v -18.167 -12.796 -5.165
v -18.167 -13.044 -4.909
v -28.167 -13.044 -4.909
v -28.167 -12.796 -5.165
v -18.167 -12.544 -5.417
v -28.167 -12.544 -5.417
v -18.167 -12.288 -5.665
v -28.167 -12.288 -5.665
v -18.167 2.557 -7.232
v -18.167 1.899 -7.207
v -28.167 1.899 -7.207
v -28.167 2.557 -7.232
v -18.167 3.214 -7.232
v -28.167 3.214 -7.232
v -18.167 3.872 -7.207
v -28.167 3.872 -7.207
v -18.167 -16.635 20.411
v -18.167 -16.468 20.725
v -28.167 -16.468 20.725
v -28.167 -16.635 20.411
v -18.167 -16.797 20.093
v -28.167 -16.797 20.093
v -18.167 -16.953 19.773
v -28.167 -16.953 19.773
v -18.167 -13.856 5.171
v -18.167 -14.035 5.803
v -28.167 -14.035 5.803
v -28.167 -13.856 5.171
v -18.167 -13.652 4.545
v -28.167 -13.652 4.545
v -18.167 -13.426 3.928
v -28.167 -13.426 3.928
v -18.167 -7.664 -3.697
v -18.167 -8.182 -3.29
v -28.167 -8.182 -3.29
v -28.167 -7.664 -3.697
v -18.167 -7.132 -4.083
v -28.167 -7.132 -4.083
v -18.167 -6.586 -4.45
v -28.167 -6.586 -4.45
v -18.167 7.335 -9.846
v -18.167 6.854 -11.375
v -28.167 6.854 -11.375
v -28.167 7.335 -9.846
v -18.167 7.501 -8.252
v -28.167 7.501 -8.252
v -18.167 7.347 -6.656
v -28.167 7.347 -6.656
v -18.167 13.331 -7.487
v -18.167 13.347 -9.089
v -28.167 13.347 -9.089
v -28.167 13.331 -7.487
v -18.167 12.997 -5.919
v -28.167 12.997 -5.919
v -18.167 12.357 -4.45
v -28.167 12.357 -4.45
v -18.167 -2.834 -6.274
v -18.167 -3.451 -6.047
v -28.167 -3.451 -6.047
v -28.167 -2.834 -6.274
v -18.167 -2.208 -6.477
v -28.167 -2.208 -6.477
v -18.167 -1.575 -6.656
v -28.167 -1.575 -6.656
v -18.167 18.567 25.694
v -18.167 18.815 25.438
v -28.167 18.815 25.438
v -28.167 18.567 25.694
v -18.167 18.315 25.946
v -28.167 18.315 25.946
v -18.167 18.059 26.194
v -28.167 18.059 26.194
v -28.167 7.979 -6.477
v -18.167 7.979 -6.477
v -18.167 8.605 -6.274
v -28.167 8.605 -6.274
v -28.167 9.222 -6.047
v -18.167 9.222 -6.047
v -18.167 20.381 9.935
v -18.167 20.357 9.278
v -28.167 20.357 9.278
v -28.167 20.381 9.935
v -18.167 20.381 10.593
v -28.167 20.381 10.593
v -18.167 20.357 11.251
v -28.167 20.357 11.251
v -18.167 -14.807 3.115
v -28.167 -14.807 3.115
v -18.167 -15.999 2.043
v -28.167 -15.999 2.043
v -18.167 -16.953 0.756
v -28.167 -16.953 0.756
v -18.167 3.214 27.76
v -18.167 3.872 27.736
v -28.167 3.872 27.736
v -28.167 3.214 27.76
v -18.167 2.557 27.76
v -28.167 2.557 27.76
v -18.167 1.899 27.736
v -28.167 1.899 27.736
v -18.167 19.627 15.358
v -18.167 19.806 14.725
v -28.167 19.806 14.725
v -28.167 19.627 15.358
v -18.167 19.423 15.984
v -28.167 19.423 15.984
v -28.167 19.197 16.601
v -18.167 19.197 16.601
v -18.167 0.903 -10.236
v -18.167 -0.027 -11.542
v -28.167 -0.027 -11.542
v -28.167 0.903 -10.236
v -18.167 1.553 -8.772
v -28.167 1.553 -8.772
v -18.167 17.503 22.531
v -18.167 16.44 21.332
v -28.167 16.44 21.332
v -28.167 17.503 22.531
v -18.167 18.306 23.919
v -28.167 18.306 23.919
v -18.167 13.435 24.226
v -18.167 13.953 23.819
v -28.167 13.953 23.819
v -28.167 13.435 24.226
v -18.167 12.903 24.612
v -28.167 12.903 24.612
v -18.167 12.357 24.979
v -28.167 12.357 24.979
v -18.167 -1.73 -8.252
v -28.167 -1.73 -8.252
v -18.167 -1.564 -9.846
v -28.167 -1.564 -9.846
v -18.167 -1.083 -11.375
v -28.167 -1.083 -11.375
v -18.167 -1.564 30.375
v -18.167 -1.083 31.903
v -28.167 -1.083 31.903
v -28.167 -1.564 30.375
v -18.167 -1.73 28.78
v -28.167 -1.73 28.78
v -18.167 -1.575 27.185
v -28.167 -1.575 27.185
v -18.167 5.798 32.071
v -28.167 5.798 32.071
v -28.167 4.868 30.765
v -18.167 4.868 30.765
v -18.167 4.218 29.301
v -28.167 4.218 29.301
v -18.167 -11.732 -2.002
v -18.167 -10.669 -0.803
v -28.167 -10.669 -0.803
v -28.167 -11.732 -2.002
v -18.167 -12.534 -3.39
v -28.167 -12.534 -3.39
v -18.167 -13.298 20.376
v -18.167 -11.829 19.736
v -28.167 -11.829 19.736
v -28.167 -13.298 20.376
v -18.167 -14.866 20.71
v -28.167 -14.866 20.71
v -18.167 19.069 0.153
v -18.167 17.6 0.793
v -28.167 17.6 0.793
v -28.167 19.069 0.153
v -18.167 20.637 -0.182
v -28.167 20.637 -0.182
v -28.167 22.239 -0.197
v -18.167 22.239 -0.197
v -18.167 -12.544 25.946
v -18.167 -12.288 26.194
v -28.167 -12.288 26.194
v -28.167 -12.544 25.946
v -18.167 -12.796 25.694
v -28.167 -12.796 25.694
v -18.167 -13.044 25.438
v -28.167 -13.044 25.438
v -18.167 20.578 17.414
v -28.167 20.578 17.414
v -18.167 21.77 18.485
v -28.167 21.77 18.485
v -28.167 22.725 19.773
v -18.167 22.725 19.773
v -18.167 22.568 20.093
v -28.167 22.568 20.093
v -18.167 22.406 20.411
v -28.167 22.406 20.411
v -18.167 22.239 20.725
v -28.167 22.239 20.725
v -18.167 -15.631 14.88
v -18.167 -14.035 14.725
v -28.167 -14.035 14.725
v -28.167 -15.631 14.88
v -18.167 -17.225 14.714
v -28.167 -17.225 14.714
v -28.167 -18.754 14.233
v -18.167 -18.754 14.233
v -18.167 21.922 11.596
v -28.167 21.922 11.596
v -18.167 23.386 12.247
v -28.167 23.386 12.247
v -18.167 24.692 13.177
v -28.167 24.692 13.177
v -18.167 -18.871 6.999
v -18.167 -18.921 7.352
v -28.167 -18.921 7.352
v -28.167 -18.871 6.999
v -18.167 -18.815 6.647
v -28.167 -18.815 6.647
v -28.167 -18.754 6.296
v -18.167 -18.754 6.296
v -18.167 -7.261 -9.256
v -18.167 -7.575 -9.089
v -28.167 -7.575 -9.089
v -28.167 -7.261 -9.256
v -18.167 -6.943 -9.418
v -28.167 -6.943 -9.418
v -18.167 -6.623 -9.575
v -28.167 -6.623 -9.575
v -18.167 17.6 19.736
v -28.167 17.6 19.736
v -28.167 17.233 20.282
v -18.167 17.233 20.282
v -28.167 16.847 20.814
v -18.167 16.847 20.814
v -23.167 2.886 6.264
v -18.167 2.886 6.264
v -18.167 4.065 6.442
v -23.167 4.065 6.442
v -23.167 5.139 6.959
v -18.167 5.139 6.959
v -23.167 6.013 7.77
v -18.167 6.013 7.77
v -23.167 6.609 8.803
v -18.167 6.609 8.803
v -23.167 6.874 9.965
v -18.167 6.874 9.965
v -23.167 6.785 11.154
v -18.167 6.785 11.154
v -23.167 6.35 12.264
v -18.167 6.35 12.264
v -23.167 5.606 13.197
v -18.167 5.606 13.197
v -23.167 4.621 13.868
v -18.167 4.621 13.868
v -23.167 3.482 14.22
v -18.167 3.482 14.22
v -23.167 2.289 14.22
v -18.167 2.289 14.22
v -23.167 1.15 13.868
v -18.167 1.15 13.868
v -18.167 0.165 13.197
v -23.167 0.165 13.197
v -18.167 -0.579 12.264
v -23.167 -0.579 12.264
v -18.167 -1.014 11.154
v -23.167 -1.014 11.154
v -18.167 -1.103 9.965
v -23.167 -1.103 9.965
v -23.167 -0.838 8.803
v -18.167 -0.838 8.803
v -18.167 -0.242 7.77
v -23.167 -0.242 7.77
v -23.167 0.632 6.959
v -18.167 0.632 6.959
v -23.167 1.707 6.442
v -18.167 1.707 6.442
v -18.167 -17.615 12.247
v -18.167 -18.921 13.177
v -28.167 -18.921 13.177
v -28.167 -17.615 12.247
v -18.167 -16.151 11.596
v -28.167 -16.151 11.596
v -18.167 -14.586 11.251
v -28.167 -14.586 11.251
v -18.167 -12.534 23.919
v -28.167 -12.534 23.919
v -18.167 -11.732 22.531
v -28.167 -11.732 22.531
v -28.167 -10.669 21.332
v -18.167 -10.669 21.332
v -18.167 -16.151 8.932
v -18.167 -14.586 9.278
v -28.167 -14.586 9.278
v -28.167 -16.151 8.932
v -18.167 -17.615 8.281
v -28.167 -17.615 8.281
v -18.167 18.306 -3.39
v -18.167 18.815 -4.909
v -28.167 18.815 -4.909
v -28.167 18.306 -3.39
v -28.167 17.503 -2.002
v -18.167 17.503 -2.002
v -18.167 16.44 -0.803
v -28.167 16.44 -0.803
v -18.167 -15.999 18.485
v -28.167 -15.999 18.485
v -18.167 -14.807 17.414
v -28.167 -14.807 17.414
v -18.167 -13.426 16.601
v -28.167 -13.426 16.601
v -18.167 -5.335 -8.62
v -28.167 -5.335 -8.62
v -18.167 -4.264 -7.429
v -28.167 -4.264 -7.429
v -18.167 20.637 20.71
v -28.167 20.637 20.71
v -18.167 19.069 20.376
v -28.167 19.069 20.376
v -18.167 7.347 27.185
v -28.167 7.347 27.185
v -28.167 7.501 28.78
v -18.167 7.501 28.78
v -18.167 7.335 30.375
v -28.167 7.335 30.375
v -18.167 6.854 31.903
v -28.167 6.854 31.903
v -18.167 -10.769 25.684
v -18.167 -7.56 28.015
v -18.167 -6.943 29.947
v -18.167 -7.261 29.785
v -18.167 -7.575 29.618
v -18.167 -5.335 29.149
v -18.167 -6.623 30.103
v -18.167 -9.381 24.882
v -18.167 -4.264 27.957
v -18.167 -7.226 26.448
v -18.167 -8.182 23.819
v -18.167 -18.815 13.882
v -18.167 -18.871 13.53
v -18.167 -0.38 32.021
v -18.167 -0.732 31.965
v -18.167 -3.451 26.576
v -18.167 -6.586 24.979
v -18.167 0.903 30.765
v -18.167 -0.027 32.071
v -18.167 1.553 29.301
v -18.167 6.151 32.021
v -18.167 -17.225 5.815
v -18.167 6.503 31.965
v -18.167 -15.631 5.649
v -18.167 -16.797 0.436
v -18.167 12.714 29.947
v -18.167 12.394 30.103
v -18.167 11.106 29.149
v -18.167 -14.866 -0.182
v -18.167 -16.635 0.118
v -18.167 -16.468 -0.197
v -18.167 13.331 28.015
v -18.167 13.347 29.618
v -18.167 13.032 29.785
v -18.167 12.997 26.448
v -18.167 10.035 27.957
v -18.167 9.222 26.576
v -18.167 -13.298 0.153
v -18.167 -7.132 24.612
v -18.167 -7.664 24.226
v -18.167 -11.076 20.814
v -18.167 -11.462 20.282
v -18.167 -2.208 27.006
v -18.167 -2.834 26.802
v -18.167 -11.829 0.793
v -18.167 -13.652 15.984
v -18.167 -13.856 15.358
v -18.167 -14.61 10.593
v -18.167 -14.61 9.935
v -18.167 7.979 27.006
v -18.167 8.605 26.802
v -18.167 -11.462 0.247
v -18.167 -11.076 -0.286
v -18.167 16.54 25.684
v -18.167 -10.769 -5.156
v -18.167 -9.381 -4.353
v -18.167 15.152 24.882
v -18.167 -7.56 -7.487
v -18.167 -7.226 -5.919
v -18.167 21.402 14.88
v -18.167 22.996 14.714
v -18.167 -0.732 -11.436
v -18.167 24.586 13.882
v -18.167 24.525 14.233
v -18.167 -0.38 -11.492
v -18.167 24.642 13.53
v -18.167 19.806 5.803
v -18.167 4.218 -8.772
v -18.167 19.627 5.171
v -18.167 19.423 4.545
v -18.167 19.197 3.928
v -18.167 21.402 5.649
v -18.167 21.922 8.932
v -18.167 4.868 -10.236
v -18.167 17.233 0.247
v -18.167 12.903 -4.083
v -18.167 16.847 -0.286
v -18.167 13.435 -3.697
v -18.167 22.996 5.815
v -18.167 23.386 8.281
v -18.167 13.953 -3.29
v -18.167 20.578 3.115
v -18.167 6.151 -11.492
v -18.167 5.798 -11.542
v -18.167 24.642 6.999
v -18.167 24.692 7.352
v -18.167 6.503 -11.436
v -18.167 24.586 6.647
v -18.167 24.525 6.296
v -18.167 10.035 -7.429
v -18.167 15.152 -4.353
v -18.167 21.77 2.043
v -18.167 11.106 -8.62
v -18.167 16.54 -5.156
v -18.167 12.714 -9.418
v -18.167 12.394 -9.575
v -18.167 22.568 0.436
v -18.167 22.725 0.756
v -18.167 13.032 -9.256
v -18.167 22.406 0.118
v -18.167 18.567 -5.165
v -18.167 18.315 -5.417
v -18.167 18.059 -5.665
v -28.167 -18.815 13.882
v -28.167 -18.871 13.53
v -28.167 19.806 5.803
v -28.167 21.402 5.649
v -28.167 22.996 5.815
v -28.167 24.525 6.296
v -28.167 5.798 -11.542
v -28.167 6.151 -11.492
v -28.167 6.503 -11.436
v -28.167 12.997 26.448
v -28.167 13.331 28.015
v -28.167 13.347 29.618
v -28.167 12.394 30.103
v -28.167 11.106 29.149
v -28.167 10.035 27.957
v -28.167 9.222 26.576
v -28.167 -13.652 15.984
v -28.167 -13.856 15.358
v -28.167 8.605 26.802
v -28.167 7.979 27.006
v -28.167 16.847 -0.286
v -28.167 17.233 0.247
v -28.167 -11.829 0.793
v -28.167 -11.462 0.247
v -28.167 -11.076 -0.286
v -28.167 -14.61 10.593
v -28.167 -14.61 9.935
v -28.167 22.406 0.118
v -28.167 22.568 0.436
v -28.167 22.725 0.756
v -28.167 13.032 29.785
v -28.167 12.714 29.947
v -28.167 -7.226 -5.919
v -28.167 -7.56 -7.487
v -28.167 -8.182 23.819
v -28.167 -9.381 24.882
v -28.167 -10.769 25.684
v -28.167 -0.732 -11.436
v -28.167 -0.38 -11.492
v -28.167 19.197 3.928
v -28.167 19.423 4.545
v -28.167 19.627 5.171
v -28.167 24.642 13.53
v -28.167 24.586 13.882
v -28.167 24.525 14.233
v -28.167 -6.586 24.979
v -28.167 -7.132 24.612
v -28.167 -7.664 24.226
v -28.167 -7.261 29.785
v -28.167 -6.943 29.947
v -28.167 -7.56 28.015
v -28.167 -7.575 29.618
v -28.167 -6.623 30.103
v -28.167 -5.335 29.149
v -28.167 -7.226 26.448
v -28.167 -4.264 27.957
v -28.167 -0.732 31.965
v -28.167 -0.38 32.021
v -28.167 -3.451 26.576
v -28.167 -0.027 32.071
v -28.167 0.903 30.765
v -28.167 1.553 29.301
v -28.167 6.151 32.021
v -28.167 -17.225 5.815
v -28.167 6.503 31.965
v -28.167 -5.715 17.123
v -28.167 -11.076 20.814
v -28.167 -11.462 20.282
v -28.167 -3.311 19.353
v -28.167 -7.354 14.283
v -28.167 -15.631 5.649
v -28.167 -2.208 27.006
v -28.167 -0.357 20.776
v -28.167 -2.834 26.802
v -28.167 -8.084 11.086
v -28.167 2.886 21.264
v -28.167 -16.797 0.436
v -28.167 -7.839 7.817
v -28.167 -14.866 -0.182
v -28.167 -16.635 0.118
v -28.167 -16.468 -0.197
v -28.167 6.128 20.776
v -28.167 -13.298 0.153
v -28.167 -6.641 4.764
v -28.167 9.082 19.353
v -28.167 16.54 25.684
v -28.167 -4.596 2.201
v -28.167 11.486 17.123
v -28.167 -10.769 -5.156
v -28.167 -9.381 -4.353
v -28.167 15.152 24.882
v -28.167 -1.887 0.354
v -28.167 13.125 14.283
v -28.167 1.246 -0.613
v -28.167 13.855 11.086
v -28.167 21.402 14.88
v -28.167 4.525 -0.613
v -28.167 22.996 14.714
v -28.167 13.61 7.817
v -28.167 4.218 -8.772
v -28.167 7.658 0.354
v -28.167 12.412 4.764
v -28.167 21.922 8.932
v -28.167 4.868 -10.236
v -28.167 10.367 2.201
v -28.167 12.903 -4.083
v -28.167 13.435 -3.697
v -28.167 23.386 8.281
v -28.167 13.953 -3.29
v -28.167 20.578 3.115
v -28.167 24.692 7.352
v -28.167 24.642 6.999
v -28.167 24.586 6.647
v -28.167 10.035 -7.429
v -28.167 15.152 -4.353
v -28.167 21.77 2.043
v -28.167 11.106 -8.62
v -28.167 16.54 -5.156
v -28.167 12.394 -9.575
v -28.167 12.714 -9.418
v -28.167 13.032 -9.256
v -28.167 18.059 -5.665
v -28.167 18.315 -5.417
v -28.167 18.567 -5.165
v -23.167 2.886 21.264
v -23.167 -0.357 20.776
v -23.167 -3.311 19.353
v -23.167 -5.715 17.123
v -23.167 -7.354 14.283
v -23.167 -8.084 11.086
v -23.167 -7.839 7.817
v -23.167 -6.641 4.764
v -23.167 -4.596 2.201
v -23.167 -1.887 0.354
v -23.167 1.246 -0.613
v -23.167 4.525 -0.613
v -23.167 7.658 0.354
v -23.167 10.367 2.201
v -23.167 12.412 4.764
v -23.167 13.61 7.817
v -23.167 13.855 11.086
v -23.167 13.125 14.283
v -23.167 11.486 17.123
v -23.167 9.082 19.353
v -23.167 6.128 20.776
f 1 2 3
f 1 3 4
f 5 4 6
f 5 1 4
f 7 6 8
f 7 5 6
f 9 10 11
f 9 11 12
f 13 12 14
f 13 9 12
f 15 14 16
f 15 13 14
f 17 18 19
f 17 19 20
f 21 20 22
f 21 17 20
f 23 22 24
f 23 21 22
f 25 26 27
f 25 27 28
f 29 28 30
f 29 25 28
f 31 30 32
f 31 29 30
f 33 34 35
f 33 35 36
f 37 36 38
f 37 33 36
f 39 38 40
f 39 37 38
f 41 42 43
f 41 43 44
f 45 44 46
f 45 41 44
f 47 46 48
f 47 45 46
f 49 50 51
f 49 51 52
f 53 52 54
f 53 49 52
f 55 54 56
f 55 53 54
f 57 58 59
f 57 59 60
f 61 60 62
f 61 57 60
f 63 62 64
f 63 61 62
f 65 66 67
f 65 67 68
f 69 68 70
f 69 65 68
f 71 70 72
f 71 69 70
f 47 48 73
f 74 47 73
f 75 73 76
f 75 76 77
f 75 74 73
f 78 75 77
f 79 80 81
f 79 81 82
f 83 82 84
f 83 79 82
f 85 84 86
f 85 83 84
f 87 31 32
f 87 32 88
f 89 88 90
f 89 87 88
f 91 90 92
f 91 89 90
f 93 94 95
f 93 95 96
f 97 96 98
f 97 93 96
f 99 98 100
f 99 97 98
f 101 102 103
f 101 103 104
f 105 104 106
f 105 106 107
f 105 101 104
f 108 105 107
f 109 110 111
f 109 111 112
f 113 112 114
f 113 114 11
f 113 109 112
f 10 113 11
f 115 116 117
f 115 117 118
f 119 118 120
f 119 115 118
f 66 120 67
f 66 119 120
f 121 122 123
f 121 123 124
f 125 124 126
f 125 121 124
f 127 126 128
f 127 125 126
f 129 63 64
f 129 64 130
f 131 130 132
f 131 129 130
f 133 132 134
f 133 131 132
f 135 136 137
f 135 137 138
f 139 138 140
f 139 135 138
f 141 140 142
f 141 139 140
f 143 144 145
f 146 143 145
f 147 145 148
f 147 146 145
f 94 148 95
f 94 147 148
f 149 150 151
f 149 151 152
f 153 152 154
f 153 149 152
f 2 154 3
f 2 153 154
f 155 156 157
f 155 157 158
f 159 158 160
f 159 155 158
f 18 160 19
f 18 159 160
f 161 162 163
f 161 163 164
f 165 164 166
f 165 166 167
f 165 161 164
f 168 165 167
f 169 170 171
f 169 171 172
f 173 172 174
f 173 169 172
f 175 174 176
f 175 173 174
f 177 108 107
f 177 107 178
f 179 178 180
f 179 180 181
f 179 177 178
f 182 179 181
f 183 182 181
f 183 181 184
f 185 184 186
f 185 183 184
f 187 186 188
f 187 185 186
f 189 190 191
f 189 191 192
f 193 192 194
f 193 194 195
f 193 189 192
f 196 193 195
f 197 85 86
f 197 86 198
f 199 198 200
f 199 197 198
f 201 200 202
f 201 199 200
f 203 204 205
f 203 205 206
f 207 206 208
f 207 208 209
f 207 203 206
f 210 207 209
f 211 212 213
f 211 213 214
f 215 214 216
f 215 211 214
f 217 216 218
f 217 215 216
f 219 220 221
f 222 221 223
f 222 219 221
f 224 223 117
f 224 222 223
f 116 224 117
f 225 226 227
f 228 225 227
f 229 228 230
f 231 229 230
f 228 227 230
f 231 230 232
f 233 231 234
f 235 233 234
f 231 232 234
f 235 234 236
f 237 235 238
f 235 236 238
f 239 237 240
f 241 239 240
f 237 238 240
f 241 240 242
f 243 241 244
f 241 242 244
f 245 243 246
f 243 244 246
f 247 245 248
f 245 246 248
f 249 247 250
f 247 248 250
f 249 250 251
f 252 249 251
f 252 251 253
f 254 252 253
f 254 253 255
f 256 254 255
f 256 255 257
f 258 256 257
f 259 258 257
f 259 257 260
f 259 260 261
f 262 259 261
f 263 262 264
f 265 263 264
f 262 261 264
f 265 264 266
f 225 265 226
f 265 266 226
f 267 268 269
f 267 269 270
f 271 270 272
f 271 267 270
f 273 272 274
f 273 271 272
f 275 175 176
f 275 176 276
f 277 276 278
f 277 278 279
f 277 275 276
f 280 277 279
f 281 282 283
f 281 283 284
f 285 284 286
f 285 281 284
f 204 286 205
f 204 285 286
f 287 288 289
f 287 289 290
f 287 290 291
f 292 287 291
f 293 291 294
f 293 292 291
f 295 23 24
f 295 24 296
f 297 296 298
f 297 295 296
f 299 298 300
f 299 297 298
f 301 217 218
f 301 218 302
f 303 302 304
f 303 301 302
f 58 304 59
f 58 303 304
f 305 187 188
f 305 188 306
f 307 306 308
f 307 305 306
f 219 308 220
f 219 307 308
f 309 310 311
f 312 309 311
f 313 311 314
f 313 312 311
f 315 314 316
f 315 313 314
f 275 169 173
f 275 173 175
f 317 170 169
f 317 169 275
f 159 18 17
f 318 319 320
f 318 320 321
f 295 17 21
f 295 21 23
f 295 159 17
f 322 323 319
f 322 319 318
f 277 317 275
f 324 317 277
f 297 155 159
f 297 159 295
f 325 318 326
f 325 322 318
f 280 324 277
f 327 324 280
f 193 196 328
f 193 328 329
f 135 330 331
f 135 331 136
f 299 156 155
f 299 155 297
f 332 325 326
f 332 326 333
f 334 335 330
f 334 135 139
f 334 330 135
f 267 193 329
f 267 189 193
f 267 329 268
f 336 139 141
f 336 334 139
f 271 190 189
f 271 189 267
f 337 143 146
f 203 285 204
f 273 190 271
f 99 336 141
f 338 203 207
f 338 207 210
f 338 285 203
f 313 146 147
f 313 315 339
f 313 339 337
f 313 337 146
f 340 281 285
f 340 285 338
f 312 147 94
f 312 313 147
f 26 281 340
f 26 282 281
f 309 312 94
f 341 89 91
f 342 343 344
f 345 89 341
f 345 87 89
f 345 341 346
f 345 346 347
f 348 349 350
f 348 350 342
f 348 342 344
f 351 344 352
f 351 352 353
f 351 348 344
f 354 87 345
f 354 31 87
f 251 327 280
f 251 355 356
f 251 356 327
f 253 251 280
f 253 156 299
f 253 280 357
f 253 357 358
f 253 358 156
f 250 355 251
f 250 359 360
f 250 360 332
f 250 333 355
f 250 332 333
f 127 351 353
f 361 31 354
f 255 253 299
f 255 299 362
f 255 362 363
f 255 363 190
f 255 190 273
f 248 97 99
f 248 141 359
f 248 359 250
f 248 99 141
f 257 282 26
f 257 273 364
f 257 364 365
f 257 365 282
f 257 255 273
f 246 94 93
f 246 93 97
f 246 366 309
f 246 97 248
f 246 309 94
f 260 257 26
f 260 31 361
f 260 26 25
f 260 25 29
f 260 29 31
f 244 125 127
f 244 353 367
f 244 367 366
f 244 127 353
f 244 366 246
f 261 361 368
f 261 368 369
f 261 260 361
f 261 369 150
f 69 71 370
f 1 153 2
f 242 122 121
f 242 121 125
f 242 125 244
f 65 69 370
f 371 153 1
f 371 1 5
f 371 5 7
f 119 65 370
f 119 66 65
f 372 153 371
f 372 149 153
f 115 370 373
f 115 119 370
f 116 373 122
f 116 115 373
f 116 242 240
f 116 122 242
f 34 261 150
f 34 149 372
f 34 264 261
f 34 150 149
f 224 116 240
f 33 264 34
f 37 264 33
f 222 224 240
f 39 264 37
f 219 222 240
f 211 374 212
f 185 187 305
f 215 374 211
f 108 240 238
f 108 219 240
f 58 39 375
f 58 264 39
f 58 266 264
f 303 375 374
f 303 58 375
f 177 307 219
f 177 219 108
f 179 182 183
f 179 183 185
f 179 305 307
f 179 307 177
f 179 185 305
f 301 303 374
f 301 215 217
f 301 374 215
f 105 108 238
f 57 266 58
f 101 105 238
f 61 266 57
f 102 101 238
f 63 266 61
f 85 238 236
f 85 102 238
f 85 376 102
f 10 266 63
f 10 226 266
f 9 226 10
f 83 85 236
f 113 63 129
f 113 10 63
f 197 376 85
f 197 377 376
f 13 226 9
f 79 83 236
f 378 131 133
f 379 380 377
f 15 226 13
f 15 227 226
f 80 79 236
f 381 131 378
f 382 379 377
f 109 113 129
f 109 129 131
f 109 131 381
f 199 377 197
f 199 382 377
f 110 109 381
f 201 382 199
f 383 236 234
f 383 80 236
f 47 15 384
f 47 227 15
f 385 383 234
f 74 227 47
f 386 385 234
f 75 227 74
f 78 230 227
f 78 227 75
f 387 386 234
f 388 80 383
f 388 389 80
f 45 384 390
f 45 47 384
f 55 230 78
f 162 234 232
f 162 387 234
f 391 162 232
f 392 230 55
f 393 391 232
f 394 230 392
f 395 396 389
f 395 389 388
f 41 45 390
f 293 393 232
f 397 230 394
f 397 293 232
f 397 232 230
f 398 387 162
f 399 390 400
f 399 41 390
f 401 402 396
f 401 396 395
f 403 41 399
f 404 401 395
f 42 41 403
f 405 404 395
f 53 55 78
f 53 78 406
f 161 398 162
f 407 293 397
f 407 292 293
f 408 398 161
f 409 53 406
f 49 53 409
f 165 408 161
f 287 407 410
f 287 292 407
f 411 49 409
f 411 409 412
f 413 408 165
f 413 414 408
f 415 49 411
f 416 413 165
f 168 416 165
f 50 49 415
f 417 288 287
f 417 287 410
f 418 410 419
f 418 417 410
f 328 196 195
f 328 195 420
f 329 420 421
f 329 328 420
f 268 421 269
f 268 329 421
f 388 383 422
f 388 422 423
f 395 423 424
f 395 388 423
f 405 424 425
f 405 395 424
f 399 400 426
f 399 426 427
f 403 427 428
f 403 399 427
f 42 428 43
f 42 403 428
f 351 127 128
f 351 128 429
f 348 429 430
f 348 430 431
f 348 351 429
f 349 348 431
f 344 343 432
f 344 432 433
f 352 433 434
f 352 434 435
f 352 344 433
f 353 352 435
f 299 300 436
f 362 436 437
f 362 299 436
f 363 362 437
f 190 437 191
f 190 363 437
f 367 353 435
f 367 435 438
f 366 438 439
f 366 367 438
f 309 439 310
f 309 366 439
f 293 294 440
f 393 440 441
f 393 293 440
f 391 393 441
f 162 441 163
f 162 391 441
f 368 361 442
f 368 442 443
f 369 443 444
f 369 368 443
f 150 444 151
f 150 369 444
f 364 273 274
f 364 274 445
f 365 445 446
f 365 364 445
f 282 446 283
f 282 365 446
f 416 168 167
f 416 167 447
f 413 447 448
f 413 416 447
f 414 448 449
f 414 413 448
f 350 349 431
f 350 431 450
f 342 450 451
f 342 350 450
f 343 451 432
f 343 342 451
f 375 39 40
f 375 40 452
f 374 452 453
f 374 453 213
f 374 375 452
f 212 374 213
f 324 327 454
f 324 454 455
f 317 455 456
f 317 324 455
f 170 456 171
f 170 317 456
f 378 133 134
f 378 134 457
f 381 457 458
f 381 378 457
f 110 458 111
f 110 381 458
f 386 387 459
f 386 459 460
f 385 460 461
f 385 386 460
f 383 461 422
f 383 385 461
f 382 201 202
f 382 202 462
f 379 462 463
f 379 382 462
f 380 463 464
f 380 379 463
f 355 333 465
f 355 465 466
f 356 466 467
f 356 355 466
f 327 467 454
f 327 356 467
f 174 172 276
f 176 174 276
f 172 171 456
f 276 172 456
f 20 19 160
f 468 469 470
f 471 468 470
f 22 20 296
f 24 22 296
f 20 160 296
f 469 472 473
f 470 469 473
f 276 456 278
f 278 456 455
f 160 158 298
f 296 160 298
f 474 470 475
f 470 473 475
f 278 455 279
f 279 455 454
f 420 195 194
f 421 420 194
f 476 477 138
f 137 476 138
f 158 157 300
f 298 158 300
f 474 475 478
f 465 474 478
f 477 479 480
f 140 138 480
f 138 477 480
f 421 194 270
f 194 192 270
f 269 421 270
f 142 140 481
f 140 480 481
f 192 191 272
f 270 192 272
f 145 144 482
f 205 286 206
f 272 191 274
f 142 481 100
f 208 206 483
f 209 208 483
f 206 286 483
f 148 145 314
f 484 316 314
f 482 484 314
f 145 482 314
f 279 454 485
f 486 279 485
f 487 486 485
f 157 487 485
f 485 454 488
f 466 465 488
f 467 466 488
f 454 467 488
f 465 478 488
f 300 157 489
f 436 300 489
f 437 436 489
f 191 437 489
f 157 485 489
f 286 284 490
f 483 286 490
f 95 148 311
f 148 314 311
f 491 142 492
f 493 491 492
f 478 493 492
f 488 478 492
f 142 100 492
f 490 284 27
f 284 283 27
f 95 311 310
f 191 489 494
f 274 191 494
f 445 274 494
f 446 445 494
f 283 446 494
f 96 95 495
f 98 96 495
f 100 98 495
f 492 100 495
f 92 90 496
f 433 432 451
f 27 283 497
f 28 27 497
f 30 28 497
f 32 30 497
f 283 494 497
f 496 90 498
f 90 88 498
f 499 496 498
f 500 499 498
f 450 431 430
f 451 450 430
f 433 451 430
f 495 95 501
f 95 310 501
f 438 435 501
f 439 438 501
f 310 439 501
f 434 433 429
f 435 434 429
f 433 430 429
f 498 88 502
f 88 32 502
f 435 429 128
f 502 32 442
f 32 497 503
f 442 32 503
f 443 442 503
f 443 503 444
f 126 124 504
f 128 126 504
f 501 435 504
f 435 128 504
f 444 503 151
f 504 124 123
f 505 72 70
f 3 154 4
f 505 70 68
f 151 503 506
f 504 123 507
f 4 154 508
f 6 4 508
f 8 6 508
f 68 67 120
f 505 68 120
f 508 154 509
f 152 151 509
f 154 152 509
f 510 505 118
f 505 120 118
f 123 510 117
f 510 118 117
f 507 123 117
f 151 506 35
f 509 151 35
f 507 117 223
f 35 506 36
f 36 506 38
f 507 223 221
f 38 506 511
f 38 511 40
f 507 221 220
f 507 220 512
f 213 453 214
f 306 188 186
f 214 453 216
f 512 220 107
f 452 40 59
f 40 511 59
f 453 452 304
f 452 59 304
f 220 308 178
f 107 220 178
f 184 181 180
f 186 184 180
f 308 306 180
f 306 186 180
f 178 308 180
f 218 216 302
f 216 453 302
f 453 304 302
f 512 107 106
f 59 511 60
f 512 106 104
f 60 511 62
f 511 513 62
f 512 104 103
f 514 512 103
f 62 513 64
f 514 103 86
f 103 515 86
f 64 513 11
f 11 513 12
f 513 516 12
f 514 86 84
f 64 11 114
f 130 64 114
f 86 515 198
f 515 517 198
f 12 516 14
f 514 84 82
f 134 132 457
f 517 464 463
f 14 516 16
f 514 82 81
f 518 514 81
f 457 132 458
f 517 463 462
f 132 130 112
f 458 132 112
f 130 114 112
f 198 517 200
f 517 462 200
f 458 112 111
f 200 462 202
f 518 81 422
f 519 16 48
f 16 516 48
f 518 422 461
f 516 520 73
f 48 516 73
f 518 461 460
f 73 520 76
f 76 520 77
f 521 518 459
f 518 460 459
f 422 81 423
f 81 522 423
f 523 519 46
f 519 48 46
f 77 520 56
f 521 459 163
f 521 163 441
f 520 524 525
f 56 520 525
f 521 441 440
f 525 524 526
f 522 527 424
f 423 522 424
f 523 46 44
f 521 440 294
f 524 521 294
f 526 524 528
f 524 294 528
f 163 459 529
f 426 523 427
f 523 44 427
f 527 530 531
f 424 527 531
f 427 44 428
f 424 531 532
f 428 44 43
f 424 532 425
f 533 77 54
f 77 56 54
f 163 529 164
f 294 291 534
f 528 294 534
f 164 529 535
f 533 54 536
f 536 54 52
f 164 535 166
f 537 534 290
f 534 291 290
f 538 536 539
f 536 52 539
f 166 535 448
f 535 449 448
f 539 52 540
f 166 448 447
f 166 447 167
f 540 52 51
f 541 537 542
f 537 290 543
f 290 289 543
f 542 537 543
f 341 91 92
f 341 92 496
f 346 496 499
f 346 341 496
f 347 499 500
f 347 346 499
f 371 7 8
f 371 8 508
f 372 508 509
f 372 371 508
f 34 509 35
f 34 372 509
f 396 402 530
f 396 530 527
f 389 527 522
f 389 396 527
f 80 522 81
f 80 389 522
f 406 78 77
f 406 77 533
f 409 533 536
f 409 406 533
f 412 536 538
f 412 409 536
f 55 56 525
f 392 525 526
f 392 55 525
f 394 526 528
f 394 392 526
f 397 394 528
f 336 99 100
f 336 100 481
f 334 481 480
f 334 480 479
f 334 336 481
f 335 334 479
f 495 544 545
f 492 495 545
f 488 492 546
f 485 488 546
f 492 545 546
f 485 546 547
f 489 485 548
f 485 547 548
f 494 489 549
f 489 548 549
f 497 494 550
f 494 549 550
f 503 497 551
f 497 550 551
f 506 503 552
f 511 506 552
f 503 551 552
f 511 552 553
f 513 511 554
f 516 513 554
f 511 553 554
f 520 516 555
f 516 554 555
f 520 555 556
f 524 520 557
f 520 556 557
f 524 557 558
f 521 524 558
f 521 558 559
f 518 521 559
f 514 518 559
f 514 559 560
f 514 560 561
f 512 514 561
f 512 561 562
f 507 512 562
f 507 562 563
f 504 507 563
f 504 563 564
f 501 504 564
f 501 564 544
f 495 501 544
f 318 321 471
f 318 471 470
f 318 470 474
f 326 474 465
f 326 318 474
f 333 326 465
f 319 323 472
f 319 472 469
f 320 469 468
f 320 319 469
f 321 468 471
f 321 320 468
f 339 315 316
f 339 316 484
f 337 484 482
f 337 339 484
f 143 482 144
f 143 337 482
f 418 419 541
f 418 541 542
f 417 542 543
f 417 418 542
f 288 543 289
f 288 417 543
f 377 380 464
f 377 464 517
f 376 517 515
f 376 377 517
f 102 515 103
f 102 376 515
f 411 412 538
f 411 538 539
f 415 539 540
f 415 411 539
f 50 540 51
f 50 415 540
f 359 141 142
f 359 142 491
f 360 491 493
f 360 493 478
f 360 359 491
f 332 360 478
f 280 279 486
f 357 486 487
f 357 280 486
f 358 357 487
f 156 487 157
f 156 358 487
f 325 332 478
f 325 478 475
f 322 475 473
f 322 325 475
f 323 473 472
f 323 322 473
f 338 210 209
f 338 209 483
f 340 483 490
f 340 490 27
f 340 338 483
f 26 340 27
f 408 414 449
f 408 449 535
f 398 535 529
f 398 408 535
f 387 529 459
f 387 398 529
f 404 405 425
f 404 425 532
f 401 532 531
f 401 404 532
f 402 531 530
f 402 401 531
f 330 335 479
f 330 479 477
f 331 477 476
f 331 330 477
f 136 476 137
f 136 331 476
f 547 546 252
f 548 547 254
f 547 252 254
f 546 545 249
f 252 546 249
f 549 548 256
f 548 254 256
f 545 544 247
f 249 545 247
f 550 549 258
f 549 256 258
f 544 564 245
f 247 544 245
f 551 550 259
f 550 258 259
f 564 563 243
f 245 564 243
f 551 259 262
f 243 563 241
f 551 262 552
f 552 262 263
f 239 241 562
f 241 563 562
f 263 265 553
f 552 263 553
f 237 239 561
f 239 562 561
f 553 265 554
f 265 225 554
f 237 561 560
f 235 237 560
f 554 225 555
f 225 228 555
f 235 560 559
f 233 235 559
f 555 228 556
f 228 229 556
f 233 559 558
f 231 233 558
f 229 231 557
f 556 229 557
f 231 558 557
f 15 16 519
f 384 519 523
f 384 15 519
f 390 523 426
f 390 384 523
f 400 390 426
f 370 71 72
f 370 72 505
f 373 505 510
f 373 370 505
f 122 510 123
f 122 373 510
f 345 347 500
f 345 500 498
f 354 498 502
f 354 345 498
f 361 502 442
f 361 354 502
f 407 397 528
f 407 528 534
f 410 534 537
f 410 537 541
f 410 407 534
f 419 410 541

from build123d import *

# Parameters (mm, degrees)
SKETCH1_R           = 11
BOSS_EXTRUDE1_DEPTH = 10
SKETCH2_R           = 11
BOSS_EXTRUDE2_DEPTH = 5
SKETCH3_R           = 4
CUT_EXTRUDE1_DEPTH  = 5


with BuildPart() as part:
    # Sketch1 → Boss-Extrude1 (new body)
    with BuildSketch(Plane(origin=(-18.166693136, 0, 0), x_dir=(0, 0, -1), z_dir=(1, 0, 0))):
        with BuildLine():
            ThreePointArc((-32.070699567, 5.798220619), (-30.049213728, 4.506228855), (-27.735555242, 3.871695857))
            ThreePointArc((-27.735555242, 3.871695857), (-27.763365626, 2.885524266), (-27.735555242, 1.899352675))
            ThreePointArc((-27.735555242, 1.899352675), (-30.049213728, 1.264819676), (-32.070699567, -0.027172088))
            ThreePointArc((-32.070699567, -0.027172088), (-31.993509119, -0.556033965), (-31.90349429, -1.08286466))
            ThreePointArc((-31.90349429, -1.08286466), (-29.581699598, -1.686948368), (-27.185198138, -1.575465319))
            ThreePointArc((-27.185198138, -1.575465319), (-26.906903604, -2.521964119), (-26.575710576, -3.451275156))
            ThreePointArc((-26.575710576, -3.451275156), (-28.580049076, -4.76971169), (-30.103348944, -6.623142354))
            ThreePointArc((-30.103348944, -6.623142354), (-29.866509158, -7.102266728), (-29.61810033, -7.575496382))
            ThreePointArc((-29.61810033, -7.575496382), (-27.223270227, -7.432540112), (-24.978512054, -6.585953754))
            ThreePointArc((-24.978512054, -6.585953754), (-24.42135401, -7.400129864), (-23.819197819, -8.181612907))
            ThreePointArc((-23.819197819, -8.181612907), (-25.318017715, -10.054895223), (-26.194020408, -12.288338081))
            ThreePointArc((-26.194020408, -12.288338081), (-25.820714812, -12.67082492), (-25.438227972, -13.044130517))
            ThreePointArc((-25.438227972, -13.044130517), (-23.204785115, -12.168127824), (-21.331502799, -10.669307928))
            ThreePointArc((-21.331502799, -10.669307928), (-20.550019756, -11.271464119), (-19.735843645, -11.828622163))
            ThreePointArc((-19.735843645, -11.828622163), (-20.582430003, -14.073380336), (-20.725386273, -16.468210439))
            ThreePointArc((-20.725386273, -16.468210439), (-20.25215662, -16.716619266), (-19.773032246, -16.953459053))
            ThreePointArc((-19.773032246, -16.953459053), (-17.919601581, -15.430159185), (-16.601165047, -13.425820685))
            ThreePointArc((-16.601165047, -13.425820685), (-15.67185401, -13.757013713), (-14.725355211, -14.035308247))
            ThreePointArc((-14.725355211, -14.035308247), (-14.83683826, -16.431809706), (-14.232754552, -18.753604398))
            ThreePointArc((-14.232754552, -18.753604398), (-13.705923857, -18.843619227), (-13.177061979, -18.920809675))
            ThreePointArc((-13.177061979, -18.920809675), (-11.885070215, -16.899323836), (-11.250537217, -14.58566535))
            ThreePointArc((-11.250537217, -14.58566535), (-10.264365626, -14.613475734), (-9.278194034, -14.58566535))
            ThreePointArc((-9.278194034, -14.58566535), (-8.643661036, -16.899323836), (-7.351669272, -18.920809675))
            ThreePointArc((-7.351669272, -18.920809675), (-6.822807395, -18.843619227), (-6.2959767, -18.753604398))
            ThreePointArc((-6.2959767, -18.753604398), (-5.691892992, -16.431809706), (-5.803376041, -14.035308247))
            ThreePointArc((-5.803376041, -14.035308247), (-4.856877241, -13.757013713), (-3.927566204, -13.425820685))
            ThreePointArc((-3.927566204, -13.425820685), (-2.60912967, -15.430159185), (-0.755699006, -16.953459053))
            ThreePointArc((-0.755699006, -16.953459053), (-0.276574631, -16.716619266), (0.196655022, -16.468210439))
            ThreePointArc((0.196655022, -16.468210439), (0.053698752, -14.073380336), (-0.792887606, -11.828622163))
            ThreePointArc((-0.792887606, -11.828622163), (0.021288504, -11.271464119), (0.802771547, -10.669307928))
            ThreePointArc((0.802771547, -10.669307928), (2.676053863, -12.168127824), (4.909496721, -13.044130517))
            ThreePointArc((4.909496721, -13.044130517), (5.29198356, -12.67082492), (5.665289157, -12.288338081))
            ThreePointArc((5.665289157, -12.288338081), (4.789286464, -10.054895223), (3.290466568, -8.181612907))
            ThreePointArc((3.290466568, -8.181612907), (3.892622759, -7.400129864), (4.449780803, -6.585953754))
            ThreePointArc((4.449780803, -6.585953754), (6.694538976, -7.432540112), (9.089369079, -7.575496382))
            ThreePointArc((9.089369079, -7.575496382), (9.337777906, -7.102266728), (9.574617693, -6.623142354))
            ThreePointArc((9.574617693, -6.623142354), (8.051317825, -4.76971169), (6.046979325, -3.451275156))
            ThreePointArc((6.046979325, -3.451275156), (6.378172353, -2.521964119), (6.656466887, -1.575465319))
            ThreePointArc((6.656466887, -1.575465319), (9.052968347, -1.686948368), (11.374763038, -1.08286466))
            ThreePointArc((11.374763038, -1.08286466), (11.464777867, -0.556033965), (11.541968315, -0.027172088))
            ThreePointArc((11.541968315, -0.027172088), (9.520482476, 1.264819676), (7.20682399, 1.899352675))
            ThreePointArc((7.20682399, 1.899352675), (7.234634374, 2.885524266), (7.20682399, 3.871695857))
            ThreePointArc((7.20682399, 3.871695857), (9.520482476, 4.506228855), (11.541968315, 5.798220619))
            ThreePointArc((11.541968315, 5.798220619), (11.464777867, 6.327082497), (11.374763038, 6.853913192))
            ThreePointArc((11.374763038, 6.853913192), (9.052968347, 7.4579969), (6.656466887, 7.346513851))
            ThreePointArc((6.656466887, 7.346513851), (6.378172353, 8.29301265), (6.046979325, 9.222323687))
            ThreePointArc((6.046979325, 9.222323687), (8.051317825, 10.540760221), (9.574617693, 12.394190886))
            ThreePointArc((9.574617693, 12.394190886), (9.337777906, 12.87331526), (9.089369079, 13.346544914))
            ThreePointArc((9.089369079, 13.346544914), (6.694538976, 13.203588643), (4.449780803, 12.357002285))
            ThreePointArc((4.449780803, 12.357002285), (3.892622759, 13.171178396), (3.290466568, 13.952661439))
            ThreePointArc((3.290466568, 13.952661439), (4.789286464, 15.825943755), (5.665289157, 18.059386612))
            ThreePointArc((5.665289157, 18.059386612), (5.29198356, 18.441873452), (4.909496721, 18.815179048))
            ThreePointArc((4.909496721, 18.815179048), (2.676053863, 17.939176356), (0.802771547, 16.440356459))
            ThreePointArc((0.802771547, 16.440356459), (0.021288504, 17.04251265), (-0.792887606, 17.599670695))
            ThreePointArc((-0.792887606, 17.599670695), (0.053698752, 19.844428867), (0.196655022, 22.23925897))
            ThreePointArc((0.196655022, 22.23925897), (-0.276574631, 22.487667798), (-0.755699006, 22.724507584))
            ThreePointArc((-0.755699006, 22.724507584), (-2.60912967, 21.201207716), (-3.927566204, 19.196869216))
            ThreePointArc((-3.927566204, 19.196869216), (-4.856877241, 19.528062244), (-5.803376041, 19.806356778))
            ThreePointArc((-5.803376041, 19.806356778), (-5.691892992, 22.202858238), (-6.2959767, 24.52465293))
            ThreePointArc((-6.2959767, 24.52465293), (-6.822807395, 24.614667759), (-7.351669272, 24.691858207))
            ThreePointArc((-7.351669272, 24.691858207), (-8.643661036, 22.670372368), (-9.278194034, 20.356713882))
            ThreePointArc((-9.278194034, 20.356713882), (-10.264365626, 20.384524266), (-11.250537217, 20.356713882))
            ThreePointArc((-11.250537217, 20.356713882), (-11.885070215, 22.670372368), (-13.177061979, 24.691858207))
            ThreePointArc((-13.177061979, 24.691858207), (-13.705923857, 24.614667759), (-14.232754552, 24.52465293))
            ThreePointArc((-14.232754552, 24.52465293), (-14.83683826, 22.202858238), (-14.725355211, 19.806356778))
            ThreePointArc((-14.725355211, 19.806356778), (-15.67185401, 19.528062244), (-16.601165047, 19.196869216))
            ThreePointArc((-16.601165047, 19.196869216), (-17.919601581, 21.201207716), (-19.773032246, 22.724507584))
            ThreePointArc((-19.773032246, 22.724507584), (-20.25215662, 22.487667798), (-20.725386273, 22.23925897))
            ThreePointArc((-20.725386273, 22.23925897), (-20.582430003, 19.844428867), (-19.735843645, 17.599670695))
            ThreePointArc((-19.735843645, 17.599670695), (-20.550019756, 17.04251265), (-21.331502799, 16.440356459))
            ThreePointArc((-21.331502799, 16.440356459), (-23.204785115, 17.939176356), (-25.438227972, 18.815179048))
            ThreePointArc((-25.438227972, 18.815179048), (-25.820714812, 18.441873452), (-26.194020408, 18.059386612))
            ThreePointArc((-26.194020408, 18.059386612), (-25.318017715, 15.825943755), (-23.819197819, 13.952661439))
            ThreePointArc((-23.819197819, 13.952661439), (-24.42135401, 13.171178396), (-24.978512054, 12.357002285))
            ThreePointArc((-24.978512054, 12.357002285), (-27.223270227, 13.203588643), (-29.61810033, 13.346544914))
            ThreePointArc((-29.61810033, 13.346544914), (-29.866509158, 12.87331526), (-30.103348944, 12.394190886))
            ThreePointArc((-30.103348944, 12.394190886), (-28.580049076, 10.540760221), (-26.575710576, 9.222323687))
            ThreePointArc((-26.575710576, 9.222323687), (-26.906903604, 8.29301265), (-27.185198138, 7.346513851))
            ThreePointArc((-27.185198138, 7.346513851), (-29.581699598, 7.4579969), (-31.90349429, 6.853913192))
            ThreePointArc((-31.90349429, 6.853913192), (-31.993509119, 6.327082497), (-32.070699567, 5.798220619))
        make_face()
        with Locations(Location((-10.264365626, 2.885524266, 0), (0, 0, 180))):
            Circle(SKETCH1_R, mode=Mode.SUBTRACT)
    extrude(amount=-BOSS_EXTRUDE1_DEPTH)

    # Sketch2 → Boss-Extrude2 (add)
    with BuildSketch(Plane(origin=(-18.166693136, 0, 0), x_dir=(0, 0, -1), z_dir=(1, 0, 0))):
        with Locations((-10.264365626, 2.885524266)):
            Circle(SKETCH2_R)
    extrude(amount=-BOSS_EXTRUDE2_DEPTH)

    # Sketch3 → Cut-Extrude1 (cut)
    with BuildSketch(Plane(origin=(-18.166693136, 0, 0), x_dir=(0, 0, -1), z_dir=(1, 0, 0))):
        with Locations((-10.264365626, 2.885524266)):
            Circle(SKETCH3_R)
    extrude(amount=-CUT_EXTRUDE1_DEPTH, mode=Mode.SUBTRACT)


solid = part.part
